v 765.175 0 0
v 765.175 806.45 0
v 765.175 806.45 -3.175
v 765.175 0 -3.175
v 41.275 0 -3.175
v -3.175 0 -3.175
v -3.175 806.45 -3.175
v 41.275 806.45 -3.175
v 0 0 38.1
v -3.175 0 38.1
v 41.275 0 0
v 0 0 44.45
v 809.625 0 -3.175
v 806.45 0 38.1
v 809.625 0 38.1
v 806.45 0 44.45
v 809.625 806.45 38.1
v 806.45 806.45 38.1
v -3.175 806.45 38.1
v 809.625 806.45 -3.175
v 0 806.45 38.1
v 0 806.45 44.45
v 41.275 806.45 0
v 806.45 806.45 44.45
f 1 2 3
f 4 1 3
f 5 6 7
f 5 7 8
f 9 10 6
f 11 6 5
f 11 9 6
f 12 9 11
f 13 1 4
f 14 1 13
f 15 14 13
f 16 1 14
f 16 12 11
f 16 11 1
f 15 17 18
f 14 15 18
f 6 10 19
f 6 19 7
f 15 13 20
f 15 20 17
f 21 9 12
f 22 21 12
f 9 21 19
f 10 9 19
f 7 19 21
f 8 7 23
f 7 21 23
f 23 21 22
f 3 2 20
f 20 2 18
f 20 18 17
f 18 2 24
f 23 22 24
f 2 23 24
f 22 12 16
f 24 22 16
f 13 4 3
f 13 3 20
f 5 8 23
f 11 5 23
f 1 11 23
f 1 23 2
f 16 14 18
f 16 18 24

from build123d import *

# Parameters (mm, degrees)
F0_W     = 806.45
F0_H     = 44.45
F1_DEPTH = 806.45
F3_DEPTH = 806.45


with BuildPart() as f1:
    # F0 (on Front) → F1 (new body)
    with BuildSketch(Plane.XZ):
        with Locations((403.225, 22.225)):
            Rectangle(F0_W, F0_H)
    extrude(amount=-F1_DEPTH)

    # F2 (on Front) → F3 (join)
    with BuildSketch(Plane.XZ):
        Polygon((-3.175, -3.175), (0, -3.175), (41.275, -3.175), (41.275, 0), (0, 0), (0, 38.1), (-3.175, 38.1), align=None)
        Polygon((765.175, -3.175), (806.45, -3.175), (809.625, -3.175), (809.625, 38.1), (806.45, 38.1), (806.45, 0), (765.175, 0), align=None)
    extrude(amount=-F3_DEPTH)


solid = f1.part
